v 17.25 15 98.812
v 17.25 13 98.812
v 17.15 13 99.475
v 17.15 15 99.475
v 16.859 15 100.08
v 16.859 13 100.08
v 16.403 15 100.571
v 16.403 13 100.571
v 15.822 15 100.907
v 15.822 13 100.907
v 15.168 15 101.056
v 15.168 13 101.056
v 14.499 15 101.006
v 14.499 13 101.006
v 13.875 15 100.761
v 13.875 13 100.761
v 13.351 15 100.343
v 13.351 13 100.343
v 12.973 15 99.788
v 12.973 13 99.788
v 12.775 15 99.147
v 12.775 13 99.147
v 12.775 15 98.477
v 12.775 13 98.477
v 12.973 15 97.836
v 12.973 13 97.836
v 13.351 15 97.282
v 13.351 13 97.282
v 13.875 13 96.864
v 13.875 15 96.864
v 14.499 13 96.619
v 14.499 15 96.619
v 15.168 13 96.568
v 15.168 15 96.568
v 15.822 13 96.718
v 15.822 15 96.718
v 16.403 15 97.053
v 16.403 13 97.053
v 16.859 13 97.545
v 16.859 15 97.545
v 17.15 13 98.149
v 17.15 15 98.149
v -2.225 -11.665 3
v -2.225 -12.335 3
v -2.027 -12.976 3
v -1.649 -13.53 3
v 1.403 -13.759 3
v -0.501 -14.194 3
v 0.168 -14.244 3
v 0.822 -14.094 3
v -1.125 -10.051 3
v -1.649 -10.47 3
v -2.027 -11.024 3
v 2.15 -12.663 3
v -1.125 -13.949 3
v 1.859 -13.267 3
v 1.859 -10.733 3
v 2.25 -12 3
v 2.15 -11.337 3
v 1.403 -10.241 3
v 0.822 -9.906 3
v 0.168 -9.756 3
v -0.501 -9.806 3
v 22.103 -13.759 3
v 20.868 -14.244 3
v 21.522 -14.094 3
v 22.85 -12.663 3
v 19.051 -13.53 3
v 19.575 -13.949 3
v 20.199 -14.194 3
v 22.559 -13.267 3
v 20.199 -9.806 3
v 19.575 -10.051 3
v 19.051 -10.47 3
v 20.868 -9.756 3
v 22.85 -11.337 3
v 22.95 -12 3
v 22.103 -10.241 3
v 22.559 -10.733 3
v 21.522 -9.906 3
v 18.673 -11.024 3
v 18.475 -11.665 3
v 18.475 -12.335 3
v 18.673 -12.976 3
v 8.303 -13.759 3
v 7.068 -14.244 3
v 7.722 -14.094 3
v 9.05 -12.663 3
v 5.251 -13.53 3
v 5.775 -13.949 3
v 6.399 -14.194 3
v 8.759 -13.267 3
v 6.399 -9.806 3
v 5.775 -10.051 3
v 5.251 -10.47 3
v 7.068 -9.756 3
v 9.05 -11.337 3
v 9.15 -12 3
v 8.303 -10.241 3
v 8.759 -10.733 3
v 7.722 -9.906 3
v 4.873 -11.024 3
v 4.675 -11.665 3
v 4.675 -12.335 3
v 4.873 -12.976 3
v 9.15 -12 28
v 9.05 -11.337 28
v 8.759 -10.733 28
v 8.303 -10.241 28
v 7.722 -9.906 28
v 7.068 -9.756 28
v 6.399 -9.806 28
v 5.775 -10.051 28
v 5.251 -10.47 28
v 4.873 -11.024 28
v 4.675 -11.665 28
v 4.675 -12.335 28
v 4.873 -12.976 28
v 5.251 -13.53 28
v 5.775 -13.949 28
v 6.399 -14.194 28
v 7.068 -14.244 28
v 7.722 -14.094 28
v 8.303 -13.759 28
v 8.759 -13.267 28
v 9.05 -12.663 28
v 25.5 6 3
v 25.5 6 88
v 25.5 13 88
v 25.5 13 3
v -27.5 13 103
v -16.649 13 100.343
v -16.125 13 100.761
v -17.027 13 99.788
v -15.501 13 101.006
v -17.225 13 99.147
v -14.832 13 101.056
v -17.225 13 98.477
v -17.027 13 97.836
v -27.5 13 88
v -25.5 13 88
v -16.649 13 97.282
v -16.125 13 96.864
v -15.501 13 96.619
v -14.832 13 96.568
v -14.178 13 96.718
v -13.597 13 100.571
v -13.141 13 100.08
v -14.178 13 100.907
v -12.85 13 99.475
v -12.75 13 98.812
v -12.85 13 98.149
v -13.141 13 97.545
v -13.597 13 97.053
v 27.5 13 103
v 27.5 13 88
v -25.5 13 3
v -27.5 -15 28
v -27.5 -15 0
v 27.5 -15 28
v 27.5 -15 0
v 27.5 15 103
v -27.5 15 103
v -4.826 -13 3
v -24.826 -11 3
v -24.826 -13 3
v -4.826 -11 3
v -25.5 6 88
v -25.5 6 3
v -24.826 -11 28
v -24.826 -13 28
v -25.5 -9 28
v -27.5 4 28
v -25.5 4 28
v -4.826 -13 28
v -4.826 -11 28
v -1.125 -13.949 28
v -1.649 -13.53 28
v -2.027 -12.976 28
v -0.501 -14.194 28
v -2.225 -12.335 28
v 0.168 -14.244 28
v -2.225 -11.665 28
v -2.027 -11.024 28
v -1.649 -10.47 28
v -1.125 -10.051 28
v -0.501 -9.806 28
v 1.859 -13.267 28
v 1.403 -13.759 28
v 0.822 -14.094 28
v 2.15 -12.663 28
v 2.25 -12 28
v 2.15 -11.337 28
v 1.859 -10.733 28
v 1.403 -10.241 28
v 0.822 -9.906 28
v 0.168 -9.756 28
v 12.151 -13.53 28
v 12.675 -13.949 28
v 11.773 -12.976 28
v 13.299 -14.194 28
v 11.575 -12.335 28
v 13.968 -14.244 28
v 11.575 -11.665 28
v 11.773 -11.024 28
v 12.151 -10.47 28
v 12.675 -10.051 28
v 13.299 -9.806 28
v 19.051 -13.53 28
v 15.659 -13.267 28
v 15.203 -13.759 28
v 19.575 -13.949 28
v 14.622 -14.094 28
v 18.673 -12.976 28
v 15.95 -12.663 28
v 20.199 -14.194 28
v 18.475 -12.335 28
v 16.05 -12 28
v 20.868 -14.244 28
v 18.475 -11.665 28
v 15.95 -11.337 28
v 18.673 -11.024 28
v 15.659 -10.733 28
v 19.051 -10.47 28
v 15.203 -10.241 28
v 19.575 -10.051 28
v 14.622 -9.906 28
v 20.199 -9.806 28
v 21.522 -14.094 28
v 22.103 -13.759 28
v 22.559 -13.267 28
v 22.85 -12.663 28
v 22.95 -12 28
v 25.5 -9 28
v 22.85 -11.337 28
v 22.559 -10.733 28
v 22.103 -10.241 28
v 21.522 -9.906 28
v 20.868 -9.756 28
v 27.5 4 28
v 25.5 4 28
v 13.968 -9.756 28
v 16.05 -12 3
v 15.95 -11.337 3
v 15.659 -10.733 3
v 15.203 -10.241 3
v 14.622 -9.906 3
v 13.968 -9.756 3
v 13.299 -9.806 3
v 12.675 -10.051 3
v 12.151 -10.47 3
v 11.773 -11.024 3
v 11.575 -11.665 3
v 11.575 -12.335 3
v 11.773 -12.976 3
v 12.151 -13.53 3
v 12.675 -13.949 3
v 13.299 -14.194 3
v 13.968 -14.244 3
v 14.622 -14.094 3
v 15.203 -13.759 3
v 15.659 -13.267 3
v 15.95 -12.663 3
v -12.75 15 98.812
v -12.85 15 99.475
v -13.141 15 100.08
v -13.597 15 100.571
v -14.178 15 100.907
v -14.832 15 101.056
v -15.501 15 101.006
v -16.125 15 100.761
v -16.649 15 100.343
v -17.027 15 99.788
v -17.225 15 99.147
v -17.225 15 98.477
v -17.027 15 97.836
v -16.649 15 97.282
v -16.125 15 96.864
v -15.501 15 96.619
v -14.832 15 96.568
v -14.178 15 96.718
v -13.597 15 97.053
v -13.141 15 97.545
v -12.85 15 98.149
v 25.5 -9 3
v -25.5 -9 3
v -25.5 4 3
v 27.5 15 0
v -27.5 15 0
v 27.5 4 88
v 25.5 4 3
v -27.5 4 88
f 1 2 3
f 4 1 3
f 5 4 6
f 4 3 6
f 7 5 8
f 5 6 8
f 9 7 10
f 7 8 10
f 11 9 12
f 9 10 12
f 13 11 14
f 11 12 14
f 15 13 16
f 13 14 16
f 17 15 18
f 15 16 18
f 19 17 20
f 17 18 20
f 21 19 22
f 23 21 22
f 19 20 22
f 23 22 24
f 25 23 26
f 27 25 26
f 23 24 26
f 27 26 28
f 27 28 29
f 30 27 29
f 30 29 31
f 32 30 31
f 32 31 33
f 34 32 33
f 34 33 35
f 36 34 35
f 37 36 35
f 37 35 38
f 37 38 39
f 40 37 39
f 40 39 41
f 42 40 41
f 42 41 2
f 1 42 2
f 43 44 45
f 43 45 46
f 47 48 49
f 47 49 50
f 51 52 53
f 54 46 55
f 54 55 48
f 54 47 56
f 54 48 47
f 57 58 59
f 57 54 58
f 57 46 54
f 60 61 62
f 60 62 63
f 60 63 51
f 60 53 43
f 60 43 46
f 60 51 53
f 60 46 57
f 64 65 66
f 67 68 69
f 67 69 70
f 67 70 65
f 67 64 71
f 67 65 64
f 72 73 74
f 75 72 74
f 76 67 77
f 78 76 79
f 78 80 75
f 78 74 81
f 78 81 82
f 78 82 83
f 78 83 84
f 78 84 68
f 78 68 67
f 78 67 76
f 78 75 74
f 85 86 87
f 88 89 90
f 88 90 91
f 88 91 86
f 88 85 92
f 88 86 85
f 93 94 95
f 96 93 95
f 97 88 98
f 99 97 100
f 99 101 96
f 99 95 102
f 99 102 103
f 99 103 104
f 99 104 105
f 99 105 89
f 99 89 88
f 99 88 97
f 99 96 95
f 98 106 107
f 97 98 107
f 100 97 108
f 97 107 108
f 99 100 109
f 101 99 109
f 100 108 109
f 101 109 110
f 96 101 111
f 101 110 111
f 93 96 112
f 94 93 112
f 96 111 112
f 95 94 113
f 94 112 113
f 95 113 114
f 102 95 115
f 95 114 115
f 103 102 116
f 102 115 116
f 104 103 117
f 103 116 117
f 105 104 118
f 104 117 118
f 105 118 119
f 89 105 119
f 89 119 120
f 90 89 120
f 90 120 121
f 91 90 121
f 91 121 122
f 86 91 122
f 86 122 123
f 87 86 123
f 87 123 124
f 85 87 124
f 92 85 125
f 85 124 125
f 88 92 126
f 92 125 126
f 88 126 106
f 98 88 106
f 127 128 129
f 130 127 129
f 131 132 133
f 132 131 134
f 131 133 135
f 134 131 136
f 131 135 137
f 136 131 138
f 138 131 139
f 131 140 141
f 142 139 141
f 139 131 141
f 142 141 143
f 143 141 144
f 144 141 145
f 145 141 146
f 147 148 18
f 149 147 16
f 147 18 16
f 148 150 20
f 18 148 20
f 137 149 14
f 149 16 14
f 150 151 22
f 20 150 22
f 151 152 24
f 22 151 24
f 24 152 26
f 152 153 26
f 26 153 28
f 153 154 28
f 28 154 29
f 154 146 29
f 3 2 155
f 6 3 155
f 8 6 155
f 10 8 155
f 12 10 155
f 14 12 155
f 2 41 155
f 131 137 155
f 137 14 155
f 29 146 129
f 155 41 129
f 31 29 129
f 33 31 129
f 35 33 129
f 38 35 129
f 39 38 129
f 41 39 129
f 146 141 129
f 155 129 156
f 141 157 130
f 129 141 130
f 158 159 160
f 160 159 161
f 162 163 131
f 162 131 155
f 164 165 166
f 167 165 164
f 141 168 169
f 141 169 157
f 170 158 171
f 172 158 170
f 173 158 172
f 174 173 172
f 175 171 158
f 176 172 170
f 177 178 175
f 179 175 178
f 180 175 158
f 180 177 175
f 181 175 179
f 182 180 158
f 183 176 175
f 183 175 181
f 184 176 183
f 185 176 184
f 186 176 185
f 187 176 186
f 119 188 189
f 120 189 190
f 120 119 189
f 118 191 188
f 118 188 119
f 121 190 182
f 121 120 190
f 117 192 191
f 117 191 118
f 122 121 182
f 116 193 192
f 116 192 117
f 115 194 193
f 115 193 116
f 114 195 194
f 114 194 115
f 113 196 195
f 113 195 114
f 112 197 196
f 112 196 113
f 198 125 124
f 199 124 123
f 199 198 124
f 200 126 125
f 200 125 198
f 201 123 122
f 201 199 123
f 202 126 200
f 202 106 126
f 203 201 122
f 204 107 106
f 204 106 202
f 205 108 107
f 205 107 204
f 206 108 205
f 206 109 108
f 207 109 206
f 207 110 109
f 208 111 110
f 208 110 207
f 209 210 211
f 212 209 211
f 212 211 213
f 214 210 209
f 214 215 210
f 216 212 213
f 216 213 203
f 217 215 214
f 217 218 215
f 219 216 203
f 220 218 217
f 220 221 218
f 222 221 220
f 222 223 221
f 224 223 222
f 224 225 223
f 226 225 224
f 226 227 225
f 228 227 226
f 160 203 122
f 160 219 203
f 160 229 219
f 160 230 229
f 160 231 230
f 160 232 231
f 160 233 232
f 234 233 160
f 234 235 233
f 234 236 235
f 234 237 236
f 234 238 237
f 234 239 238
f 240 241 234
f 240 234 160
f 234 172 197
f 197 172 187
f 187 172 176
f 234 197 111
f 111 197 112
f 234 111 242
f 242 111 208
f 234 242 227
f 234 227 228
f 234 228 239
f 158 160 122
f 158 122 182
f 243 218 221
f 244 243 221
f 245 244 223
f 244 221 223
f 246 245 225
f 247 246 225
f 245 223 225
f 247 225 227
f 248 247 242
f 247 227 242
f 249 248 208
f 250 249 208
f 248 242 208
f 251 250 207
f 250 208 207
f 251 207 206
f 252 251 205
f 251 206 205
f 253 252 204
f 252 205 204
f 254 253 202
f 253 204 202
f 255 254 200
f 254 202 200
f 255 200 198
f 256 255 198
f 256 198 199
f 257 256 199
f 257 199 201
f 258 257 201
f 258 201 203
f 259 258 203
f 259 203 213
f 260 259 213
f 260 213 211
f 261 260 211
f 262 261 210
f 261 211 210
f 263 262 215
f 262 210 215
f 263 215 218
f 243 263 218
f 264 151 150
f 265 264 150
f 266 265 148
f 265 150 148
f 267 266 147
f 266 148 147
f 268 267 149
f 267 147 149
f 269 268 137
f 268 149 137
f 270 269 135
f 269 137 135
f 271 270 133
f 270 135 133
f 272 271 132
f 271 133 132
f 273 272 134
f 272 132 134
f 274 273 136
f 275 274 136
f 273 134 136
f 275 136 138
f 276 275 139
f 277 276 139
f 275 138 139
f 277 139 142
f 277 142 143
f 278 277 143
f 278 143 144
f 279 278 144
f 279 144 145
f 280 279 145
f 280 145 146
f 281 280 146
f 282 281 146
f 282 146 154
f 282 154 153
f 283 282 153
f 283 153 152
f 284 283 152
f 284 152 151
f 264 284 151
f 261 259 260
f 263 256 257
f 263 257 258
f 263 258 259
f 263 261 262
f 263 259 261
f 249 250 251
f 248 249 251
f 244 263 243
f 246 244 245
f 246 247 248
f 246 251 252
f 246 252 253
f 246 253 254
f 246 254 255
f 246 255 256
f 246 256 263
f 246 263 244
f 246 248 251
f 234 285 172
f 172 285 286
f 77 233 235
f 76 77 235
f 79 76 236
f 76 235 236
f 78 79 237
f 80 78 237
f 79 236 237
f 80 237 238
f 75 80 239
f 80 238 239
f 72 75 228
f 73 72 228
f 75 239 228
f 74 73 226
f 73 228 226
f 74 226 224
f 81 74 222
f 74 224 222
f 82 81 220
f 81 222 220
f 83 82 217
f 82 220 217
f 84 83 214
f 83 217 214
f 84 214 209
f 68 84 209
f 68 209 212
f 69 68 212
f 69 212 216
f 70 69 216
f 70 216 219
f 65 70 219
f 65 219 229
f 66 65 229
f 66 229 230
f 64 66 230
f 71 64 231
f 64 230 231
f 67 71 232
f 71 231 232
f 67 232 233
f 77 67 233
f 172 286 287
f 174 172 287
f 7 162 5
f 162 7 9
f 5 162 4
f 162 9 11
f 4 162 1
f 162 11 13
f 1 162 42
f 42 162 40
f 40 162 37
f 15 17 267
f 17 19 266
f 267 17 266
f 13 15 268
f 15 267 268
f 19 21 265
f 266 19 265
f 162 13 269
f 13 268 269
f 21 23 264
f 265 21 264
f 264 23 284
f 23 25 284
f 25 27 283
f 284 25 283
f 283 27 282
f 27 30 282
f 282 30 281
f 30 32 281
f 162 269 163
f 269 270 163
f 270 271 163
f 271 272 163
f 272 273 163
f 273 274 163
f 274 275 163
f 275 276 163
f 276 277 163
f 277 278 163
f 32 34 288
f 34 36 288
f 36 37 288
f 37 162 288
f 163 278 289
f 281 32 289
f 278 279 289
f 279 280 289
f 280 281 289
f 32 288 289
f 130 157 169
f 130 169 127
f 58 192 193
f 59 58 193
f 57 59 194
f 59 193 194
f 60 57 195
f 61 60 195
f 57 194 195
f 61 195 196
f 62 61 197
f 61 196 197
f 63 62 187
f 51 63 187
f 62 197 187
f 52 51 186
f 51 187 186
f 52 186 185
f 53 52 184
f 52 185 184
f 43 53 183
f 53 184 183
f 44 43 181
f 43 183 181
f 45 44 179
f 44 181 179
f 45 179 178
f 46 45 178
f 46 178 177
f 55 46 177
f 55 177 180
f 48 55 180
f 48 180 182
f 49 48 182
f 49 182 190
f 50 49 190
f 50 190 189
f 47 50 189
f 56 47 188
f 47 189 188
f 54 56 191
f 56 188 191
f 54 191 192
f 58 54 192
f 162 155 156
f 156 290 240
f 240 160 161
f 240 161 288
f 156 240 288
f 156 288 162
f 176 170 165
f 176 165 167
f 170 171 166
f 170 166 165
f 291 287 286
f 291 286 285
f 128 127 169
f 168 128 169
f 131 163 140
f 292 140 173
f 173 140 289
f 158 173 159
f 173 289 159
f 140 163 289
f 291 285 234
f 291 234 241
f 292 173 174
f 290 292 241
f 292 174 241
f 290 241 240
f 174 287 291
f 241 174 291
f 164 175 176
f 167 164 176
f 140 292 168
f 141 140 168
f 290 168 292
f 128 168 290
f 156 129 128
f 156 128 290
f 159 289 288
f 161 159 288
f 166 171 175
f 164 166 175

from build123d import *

# Parameters (mm, degrees)
F0_W     = 55
F0_H     = 30
F1_DEPTH = 3
F3_DEPTH = 100
F2_W     = 2
F2_H     = 7
F4_DEPTH = 85
F2_H_2   = 13
F5_DEPTH = 25
F6_R     = 2.25
F6_W     = 20
F6_H     = 2
F7_DEPTH = 25
F8_R     = 2.25
F9_DEPTH = 2.001


with BuildPart() as f1:
    # F0 (on Top) → F1 (new body)
    with BuildSketch(Plane.XY):
        Rectangle(F0_W, F0_H)
    extrude(amount=F1_DEPTH)

    # F2 (on face) → F3 (join)
    with BuildSketch(Plane.XY.offset(3)):
        Polygon((27.5, 15), (-27.5, 15), (-27.5, 13), (-25.5, 13), (25.5, 13), (27.5, 13), align=None)
    extrude(amount=F3_DEPTH)

    # F2 (on face) → F4 (join)
    with BuildSketch(Plane.XY.offset(3)):
        with Locations((-26.5, 9.5)):
            Rectangle(F2_W, F2_H)
        Polygon((-25.5, 6), (-27.5, 6), (-27.5, 4), (-25.5, 4), (25.5, 4), (27.5, 4), (27.5, 6), (25.5, 6), align=None)
        with Locations((26.5, 9.5)):
            Rectangle(F2_W, F2_H)
    extrude(amount=F4_DEPTH)

    # F2 (on face) → F5 (join)
    with BuildSketch(Plane.XY.offset(3)):
        with Locations((26.5, -2.5)):
            Rectangle(F2_W, F2_H_2)
        Polygon((-25.5, -9), (-27.5, -9), (-27.5, -15), (27.5, -15), (27.5, -9), (25.5, -9), align=None)
        with Locations((-26.5, -2.5)):
            Rectangle(F2_W, F2_H_2)
    extrude(amount=F5_DEPTH)

    # F6 (on face) → F7 (cut)
    with BuildSketch(Plane.XY.offset(28)):
        with Locations((0, -12)):
            Circle(F6_R)
        with Locations((6.9, -12)):
            Circle(F6_R)
        with Locations((13.8, -12)):
            Circle(F6_R)
        with Locations((20.7, -12)):
            Circle(F6_R)
        with Locations((-14.826222, -12)):
            Rectangle(F6_W, F6_H)
    extrude(amount=-F7_DEPTH, mode=Mode.SUBTRACT)

    # F8 (on face) → F9 (cut, through all)
    with BuildSketch(Plane.XZ.offset(-13)):
        with Locations((-15, 98.812126)):
            Circle(F8_R)
        with Locations((15, 98.812126)):
            Circle(F8_R)
    extrude(amount=-F9_DEPTH, mode=Mode.SUBTRACT)


solid = f1.part
